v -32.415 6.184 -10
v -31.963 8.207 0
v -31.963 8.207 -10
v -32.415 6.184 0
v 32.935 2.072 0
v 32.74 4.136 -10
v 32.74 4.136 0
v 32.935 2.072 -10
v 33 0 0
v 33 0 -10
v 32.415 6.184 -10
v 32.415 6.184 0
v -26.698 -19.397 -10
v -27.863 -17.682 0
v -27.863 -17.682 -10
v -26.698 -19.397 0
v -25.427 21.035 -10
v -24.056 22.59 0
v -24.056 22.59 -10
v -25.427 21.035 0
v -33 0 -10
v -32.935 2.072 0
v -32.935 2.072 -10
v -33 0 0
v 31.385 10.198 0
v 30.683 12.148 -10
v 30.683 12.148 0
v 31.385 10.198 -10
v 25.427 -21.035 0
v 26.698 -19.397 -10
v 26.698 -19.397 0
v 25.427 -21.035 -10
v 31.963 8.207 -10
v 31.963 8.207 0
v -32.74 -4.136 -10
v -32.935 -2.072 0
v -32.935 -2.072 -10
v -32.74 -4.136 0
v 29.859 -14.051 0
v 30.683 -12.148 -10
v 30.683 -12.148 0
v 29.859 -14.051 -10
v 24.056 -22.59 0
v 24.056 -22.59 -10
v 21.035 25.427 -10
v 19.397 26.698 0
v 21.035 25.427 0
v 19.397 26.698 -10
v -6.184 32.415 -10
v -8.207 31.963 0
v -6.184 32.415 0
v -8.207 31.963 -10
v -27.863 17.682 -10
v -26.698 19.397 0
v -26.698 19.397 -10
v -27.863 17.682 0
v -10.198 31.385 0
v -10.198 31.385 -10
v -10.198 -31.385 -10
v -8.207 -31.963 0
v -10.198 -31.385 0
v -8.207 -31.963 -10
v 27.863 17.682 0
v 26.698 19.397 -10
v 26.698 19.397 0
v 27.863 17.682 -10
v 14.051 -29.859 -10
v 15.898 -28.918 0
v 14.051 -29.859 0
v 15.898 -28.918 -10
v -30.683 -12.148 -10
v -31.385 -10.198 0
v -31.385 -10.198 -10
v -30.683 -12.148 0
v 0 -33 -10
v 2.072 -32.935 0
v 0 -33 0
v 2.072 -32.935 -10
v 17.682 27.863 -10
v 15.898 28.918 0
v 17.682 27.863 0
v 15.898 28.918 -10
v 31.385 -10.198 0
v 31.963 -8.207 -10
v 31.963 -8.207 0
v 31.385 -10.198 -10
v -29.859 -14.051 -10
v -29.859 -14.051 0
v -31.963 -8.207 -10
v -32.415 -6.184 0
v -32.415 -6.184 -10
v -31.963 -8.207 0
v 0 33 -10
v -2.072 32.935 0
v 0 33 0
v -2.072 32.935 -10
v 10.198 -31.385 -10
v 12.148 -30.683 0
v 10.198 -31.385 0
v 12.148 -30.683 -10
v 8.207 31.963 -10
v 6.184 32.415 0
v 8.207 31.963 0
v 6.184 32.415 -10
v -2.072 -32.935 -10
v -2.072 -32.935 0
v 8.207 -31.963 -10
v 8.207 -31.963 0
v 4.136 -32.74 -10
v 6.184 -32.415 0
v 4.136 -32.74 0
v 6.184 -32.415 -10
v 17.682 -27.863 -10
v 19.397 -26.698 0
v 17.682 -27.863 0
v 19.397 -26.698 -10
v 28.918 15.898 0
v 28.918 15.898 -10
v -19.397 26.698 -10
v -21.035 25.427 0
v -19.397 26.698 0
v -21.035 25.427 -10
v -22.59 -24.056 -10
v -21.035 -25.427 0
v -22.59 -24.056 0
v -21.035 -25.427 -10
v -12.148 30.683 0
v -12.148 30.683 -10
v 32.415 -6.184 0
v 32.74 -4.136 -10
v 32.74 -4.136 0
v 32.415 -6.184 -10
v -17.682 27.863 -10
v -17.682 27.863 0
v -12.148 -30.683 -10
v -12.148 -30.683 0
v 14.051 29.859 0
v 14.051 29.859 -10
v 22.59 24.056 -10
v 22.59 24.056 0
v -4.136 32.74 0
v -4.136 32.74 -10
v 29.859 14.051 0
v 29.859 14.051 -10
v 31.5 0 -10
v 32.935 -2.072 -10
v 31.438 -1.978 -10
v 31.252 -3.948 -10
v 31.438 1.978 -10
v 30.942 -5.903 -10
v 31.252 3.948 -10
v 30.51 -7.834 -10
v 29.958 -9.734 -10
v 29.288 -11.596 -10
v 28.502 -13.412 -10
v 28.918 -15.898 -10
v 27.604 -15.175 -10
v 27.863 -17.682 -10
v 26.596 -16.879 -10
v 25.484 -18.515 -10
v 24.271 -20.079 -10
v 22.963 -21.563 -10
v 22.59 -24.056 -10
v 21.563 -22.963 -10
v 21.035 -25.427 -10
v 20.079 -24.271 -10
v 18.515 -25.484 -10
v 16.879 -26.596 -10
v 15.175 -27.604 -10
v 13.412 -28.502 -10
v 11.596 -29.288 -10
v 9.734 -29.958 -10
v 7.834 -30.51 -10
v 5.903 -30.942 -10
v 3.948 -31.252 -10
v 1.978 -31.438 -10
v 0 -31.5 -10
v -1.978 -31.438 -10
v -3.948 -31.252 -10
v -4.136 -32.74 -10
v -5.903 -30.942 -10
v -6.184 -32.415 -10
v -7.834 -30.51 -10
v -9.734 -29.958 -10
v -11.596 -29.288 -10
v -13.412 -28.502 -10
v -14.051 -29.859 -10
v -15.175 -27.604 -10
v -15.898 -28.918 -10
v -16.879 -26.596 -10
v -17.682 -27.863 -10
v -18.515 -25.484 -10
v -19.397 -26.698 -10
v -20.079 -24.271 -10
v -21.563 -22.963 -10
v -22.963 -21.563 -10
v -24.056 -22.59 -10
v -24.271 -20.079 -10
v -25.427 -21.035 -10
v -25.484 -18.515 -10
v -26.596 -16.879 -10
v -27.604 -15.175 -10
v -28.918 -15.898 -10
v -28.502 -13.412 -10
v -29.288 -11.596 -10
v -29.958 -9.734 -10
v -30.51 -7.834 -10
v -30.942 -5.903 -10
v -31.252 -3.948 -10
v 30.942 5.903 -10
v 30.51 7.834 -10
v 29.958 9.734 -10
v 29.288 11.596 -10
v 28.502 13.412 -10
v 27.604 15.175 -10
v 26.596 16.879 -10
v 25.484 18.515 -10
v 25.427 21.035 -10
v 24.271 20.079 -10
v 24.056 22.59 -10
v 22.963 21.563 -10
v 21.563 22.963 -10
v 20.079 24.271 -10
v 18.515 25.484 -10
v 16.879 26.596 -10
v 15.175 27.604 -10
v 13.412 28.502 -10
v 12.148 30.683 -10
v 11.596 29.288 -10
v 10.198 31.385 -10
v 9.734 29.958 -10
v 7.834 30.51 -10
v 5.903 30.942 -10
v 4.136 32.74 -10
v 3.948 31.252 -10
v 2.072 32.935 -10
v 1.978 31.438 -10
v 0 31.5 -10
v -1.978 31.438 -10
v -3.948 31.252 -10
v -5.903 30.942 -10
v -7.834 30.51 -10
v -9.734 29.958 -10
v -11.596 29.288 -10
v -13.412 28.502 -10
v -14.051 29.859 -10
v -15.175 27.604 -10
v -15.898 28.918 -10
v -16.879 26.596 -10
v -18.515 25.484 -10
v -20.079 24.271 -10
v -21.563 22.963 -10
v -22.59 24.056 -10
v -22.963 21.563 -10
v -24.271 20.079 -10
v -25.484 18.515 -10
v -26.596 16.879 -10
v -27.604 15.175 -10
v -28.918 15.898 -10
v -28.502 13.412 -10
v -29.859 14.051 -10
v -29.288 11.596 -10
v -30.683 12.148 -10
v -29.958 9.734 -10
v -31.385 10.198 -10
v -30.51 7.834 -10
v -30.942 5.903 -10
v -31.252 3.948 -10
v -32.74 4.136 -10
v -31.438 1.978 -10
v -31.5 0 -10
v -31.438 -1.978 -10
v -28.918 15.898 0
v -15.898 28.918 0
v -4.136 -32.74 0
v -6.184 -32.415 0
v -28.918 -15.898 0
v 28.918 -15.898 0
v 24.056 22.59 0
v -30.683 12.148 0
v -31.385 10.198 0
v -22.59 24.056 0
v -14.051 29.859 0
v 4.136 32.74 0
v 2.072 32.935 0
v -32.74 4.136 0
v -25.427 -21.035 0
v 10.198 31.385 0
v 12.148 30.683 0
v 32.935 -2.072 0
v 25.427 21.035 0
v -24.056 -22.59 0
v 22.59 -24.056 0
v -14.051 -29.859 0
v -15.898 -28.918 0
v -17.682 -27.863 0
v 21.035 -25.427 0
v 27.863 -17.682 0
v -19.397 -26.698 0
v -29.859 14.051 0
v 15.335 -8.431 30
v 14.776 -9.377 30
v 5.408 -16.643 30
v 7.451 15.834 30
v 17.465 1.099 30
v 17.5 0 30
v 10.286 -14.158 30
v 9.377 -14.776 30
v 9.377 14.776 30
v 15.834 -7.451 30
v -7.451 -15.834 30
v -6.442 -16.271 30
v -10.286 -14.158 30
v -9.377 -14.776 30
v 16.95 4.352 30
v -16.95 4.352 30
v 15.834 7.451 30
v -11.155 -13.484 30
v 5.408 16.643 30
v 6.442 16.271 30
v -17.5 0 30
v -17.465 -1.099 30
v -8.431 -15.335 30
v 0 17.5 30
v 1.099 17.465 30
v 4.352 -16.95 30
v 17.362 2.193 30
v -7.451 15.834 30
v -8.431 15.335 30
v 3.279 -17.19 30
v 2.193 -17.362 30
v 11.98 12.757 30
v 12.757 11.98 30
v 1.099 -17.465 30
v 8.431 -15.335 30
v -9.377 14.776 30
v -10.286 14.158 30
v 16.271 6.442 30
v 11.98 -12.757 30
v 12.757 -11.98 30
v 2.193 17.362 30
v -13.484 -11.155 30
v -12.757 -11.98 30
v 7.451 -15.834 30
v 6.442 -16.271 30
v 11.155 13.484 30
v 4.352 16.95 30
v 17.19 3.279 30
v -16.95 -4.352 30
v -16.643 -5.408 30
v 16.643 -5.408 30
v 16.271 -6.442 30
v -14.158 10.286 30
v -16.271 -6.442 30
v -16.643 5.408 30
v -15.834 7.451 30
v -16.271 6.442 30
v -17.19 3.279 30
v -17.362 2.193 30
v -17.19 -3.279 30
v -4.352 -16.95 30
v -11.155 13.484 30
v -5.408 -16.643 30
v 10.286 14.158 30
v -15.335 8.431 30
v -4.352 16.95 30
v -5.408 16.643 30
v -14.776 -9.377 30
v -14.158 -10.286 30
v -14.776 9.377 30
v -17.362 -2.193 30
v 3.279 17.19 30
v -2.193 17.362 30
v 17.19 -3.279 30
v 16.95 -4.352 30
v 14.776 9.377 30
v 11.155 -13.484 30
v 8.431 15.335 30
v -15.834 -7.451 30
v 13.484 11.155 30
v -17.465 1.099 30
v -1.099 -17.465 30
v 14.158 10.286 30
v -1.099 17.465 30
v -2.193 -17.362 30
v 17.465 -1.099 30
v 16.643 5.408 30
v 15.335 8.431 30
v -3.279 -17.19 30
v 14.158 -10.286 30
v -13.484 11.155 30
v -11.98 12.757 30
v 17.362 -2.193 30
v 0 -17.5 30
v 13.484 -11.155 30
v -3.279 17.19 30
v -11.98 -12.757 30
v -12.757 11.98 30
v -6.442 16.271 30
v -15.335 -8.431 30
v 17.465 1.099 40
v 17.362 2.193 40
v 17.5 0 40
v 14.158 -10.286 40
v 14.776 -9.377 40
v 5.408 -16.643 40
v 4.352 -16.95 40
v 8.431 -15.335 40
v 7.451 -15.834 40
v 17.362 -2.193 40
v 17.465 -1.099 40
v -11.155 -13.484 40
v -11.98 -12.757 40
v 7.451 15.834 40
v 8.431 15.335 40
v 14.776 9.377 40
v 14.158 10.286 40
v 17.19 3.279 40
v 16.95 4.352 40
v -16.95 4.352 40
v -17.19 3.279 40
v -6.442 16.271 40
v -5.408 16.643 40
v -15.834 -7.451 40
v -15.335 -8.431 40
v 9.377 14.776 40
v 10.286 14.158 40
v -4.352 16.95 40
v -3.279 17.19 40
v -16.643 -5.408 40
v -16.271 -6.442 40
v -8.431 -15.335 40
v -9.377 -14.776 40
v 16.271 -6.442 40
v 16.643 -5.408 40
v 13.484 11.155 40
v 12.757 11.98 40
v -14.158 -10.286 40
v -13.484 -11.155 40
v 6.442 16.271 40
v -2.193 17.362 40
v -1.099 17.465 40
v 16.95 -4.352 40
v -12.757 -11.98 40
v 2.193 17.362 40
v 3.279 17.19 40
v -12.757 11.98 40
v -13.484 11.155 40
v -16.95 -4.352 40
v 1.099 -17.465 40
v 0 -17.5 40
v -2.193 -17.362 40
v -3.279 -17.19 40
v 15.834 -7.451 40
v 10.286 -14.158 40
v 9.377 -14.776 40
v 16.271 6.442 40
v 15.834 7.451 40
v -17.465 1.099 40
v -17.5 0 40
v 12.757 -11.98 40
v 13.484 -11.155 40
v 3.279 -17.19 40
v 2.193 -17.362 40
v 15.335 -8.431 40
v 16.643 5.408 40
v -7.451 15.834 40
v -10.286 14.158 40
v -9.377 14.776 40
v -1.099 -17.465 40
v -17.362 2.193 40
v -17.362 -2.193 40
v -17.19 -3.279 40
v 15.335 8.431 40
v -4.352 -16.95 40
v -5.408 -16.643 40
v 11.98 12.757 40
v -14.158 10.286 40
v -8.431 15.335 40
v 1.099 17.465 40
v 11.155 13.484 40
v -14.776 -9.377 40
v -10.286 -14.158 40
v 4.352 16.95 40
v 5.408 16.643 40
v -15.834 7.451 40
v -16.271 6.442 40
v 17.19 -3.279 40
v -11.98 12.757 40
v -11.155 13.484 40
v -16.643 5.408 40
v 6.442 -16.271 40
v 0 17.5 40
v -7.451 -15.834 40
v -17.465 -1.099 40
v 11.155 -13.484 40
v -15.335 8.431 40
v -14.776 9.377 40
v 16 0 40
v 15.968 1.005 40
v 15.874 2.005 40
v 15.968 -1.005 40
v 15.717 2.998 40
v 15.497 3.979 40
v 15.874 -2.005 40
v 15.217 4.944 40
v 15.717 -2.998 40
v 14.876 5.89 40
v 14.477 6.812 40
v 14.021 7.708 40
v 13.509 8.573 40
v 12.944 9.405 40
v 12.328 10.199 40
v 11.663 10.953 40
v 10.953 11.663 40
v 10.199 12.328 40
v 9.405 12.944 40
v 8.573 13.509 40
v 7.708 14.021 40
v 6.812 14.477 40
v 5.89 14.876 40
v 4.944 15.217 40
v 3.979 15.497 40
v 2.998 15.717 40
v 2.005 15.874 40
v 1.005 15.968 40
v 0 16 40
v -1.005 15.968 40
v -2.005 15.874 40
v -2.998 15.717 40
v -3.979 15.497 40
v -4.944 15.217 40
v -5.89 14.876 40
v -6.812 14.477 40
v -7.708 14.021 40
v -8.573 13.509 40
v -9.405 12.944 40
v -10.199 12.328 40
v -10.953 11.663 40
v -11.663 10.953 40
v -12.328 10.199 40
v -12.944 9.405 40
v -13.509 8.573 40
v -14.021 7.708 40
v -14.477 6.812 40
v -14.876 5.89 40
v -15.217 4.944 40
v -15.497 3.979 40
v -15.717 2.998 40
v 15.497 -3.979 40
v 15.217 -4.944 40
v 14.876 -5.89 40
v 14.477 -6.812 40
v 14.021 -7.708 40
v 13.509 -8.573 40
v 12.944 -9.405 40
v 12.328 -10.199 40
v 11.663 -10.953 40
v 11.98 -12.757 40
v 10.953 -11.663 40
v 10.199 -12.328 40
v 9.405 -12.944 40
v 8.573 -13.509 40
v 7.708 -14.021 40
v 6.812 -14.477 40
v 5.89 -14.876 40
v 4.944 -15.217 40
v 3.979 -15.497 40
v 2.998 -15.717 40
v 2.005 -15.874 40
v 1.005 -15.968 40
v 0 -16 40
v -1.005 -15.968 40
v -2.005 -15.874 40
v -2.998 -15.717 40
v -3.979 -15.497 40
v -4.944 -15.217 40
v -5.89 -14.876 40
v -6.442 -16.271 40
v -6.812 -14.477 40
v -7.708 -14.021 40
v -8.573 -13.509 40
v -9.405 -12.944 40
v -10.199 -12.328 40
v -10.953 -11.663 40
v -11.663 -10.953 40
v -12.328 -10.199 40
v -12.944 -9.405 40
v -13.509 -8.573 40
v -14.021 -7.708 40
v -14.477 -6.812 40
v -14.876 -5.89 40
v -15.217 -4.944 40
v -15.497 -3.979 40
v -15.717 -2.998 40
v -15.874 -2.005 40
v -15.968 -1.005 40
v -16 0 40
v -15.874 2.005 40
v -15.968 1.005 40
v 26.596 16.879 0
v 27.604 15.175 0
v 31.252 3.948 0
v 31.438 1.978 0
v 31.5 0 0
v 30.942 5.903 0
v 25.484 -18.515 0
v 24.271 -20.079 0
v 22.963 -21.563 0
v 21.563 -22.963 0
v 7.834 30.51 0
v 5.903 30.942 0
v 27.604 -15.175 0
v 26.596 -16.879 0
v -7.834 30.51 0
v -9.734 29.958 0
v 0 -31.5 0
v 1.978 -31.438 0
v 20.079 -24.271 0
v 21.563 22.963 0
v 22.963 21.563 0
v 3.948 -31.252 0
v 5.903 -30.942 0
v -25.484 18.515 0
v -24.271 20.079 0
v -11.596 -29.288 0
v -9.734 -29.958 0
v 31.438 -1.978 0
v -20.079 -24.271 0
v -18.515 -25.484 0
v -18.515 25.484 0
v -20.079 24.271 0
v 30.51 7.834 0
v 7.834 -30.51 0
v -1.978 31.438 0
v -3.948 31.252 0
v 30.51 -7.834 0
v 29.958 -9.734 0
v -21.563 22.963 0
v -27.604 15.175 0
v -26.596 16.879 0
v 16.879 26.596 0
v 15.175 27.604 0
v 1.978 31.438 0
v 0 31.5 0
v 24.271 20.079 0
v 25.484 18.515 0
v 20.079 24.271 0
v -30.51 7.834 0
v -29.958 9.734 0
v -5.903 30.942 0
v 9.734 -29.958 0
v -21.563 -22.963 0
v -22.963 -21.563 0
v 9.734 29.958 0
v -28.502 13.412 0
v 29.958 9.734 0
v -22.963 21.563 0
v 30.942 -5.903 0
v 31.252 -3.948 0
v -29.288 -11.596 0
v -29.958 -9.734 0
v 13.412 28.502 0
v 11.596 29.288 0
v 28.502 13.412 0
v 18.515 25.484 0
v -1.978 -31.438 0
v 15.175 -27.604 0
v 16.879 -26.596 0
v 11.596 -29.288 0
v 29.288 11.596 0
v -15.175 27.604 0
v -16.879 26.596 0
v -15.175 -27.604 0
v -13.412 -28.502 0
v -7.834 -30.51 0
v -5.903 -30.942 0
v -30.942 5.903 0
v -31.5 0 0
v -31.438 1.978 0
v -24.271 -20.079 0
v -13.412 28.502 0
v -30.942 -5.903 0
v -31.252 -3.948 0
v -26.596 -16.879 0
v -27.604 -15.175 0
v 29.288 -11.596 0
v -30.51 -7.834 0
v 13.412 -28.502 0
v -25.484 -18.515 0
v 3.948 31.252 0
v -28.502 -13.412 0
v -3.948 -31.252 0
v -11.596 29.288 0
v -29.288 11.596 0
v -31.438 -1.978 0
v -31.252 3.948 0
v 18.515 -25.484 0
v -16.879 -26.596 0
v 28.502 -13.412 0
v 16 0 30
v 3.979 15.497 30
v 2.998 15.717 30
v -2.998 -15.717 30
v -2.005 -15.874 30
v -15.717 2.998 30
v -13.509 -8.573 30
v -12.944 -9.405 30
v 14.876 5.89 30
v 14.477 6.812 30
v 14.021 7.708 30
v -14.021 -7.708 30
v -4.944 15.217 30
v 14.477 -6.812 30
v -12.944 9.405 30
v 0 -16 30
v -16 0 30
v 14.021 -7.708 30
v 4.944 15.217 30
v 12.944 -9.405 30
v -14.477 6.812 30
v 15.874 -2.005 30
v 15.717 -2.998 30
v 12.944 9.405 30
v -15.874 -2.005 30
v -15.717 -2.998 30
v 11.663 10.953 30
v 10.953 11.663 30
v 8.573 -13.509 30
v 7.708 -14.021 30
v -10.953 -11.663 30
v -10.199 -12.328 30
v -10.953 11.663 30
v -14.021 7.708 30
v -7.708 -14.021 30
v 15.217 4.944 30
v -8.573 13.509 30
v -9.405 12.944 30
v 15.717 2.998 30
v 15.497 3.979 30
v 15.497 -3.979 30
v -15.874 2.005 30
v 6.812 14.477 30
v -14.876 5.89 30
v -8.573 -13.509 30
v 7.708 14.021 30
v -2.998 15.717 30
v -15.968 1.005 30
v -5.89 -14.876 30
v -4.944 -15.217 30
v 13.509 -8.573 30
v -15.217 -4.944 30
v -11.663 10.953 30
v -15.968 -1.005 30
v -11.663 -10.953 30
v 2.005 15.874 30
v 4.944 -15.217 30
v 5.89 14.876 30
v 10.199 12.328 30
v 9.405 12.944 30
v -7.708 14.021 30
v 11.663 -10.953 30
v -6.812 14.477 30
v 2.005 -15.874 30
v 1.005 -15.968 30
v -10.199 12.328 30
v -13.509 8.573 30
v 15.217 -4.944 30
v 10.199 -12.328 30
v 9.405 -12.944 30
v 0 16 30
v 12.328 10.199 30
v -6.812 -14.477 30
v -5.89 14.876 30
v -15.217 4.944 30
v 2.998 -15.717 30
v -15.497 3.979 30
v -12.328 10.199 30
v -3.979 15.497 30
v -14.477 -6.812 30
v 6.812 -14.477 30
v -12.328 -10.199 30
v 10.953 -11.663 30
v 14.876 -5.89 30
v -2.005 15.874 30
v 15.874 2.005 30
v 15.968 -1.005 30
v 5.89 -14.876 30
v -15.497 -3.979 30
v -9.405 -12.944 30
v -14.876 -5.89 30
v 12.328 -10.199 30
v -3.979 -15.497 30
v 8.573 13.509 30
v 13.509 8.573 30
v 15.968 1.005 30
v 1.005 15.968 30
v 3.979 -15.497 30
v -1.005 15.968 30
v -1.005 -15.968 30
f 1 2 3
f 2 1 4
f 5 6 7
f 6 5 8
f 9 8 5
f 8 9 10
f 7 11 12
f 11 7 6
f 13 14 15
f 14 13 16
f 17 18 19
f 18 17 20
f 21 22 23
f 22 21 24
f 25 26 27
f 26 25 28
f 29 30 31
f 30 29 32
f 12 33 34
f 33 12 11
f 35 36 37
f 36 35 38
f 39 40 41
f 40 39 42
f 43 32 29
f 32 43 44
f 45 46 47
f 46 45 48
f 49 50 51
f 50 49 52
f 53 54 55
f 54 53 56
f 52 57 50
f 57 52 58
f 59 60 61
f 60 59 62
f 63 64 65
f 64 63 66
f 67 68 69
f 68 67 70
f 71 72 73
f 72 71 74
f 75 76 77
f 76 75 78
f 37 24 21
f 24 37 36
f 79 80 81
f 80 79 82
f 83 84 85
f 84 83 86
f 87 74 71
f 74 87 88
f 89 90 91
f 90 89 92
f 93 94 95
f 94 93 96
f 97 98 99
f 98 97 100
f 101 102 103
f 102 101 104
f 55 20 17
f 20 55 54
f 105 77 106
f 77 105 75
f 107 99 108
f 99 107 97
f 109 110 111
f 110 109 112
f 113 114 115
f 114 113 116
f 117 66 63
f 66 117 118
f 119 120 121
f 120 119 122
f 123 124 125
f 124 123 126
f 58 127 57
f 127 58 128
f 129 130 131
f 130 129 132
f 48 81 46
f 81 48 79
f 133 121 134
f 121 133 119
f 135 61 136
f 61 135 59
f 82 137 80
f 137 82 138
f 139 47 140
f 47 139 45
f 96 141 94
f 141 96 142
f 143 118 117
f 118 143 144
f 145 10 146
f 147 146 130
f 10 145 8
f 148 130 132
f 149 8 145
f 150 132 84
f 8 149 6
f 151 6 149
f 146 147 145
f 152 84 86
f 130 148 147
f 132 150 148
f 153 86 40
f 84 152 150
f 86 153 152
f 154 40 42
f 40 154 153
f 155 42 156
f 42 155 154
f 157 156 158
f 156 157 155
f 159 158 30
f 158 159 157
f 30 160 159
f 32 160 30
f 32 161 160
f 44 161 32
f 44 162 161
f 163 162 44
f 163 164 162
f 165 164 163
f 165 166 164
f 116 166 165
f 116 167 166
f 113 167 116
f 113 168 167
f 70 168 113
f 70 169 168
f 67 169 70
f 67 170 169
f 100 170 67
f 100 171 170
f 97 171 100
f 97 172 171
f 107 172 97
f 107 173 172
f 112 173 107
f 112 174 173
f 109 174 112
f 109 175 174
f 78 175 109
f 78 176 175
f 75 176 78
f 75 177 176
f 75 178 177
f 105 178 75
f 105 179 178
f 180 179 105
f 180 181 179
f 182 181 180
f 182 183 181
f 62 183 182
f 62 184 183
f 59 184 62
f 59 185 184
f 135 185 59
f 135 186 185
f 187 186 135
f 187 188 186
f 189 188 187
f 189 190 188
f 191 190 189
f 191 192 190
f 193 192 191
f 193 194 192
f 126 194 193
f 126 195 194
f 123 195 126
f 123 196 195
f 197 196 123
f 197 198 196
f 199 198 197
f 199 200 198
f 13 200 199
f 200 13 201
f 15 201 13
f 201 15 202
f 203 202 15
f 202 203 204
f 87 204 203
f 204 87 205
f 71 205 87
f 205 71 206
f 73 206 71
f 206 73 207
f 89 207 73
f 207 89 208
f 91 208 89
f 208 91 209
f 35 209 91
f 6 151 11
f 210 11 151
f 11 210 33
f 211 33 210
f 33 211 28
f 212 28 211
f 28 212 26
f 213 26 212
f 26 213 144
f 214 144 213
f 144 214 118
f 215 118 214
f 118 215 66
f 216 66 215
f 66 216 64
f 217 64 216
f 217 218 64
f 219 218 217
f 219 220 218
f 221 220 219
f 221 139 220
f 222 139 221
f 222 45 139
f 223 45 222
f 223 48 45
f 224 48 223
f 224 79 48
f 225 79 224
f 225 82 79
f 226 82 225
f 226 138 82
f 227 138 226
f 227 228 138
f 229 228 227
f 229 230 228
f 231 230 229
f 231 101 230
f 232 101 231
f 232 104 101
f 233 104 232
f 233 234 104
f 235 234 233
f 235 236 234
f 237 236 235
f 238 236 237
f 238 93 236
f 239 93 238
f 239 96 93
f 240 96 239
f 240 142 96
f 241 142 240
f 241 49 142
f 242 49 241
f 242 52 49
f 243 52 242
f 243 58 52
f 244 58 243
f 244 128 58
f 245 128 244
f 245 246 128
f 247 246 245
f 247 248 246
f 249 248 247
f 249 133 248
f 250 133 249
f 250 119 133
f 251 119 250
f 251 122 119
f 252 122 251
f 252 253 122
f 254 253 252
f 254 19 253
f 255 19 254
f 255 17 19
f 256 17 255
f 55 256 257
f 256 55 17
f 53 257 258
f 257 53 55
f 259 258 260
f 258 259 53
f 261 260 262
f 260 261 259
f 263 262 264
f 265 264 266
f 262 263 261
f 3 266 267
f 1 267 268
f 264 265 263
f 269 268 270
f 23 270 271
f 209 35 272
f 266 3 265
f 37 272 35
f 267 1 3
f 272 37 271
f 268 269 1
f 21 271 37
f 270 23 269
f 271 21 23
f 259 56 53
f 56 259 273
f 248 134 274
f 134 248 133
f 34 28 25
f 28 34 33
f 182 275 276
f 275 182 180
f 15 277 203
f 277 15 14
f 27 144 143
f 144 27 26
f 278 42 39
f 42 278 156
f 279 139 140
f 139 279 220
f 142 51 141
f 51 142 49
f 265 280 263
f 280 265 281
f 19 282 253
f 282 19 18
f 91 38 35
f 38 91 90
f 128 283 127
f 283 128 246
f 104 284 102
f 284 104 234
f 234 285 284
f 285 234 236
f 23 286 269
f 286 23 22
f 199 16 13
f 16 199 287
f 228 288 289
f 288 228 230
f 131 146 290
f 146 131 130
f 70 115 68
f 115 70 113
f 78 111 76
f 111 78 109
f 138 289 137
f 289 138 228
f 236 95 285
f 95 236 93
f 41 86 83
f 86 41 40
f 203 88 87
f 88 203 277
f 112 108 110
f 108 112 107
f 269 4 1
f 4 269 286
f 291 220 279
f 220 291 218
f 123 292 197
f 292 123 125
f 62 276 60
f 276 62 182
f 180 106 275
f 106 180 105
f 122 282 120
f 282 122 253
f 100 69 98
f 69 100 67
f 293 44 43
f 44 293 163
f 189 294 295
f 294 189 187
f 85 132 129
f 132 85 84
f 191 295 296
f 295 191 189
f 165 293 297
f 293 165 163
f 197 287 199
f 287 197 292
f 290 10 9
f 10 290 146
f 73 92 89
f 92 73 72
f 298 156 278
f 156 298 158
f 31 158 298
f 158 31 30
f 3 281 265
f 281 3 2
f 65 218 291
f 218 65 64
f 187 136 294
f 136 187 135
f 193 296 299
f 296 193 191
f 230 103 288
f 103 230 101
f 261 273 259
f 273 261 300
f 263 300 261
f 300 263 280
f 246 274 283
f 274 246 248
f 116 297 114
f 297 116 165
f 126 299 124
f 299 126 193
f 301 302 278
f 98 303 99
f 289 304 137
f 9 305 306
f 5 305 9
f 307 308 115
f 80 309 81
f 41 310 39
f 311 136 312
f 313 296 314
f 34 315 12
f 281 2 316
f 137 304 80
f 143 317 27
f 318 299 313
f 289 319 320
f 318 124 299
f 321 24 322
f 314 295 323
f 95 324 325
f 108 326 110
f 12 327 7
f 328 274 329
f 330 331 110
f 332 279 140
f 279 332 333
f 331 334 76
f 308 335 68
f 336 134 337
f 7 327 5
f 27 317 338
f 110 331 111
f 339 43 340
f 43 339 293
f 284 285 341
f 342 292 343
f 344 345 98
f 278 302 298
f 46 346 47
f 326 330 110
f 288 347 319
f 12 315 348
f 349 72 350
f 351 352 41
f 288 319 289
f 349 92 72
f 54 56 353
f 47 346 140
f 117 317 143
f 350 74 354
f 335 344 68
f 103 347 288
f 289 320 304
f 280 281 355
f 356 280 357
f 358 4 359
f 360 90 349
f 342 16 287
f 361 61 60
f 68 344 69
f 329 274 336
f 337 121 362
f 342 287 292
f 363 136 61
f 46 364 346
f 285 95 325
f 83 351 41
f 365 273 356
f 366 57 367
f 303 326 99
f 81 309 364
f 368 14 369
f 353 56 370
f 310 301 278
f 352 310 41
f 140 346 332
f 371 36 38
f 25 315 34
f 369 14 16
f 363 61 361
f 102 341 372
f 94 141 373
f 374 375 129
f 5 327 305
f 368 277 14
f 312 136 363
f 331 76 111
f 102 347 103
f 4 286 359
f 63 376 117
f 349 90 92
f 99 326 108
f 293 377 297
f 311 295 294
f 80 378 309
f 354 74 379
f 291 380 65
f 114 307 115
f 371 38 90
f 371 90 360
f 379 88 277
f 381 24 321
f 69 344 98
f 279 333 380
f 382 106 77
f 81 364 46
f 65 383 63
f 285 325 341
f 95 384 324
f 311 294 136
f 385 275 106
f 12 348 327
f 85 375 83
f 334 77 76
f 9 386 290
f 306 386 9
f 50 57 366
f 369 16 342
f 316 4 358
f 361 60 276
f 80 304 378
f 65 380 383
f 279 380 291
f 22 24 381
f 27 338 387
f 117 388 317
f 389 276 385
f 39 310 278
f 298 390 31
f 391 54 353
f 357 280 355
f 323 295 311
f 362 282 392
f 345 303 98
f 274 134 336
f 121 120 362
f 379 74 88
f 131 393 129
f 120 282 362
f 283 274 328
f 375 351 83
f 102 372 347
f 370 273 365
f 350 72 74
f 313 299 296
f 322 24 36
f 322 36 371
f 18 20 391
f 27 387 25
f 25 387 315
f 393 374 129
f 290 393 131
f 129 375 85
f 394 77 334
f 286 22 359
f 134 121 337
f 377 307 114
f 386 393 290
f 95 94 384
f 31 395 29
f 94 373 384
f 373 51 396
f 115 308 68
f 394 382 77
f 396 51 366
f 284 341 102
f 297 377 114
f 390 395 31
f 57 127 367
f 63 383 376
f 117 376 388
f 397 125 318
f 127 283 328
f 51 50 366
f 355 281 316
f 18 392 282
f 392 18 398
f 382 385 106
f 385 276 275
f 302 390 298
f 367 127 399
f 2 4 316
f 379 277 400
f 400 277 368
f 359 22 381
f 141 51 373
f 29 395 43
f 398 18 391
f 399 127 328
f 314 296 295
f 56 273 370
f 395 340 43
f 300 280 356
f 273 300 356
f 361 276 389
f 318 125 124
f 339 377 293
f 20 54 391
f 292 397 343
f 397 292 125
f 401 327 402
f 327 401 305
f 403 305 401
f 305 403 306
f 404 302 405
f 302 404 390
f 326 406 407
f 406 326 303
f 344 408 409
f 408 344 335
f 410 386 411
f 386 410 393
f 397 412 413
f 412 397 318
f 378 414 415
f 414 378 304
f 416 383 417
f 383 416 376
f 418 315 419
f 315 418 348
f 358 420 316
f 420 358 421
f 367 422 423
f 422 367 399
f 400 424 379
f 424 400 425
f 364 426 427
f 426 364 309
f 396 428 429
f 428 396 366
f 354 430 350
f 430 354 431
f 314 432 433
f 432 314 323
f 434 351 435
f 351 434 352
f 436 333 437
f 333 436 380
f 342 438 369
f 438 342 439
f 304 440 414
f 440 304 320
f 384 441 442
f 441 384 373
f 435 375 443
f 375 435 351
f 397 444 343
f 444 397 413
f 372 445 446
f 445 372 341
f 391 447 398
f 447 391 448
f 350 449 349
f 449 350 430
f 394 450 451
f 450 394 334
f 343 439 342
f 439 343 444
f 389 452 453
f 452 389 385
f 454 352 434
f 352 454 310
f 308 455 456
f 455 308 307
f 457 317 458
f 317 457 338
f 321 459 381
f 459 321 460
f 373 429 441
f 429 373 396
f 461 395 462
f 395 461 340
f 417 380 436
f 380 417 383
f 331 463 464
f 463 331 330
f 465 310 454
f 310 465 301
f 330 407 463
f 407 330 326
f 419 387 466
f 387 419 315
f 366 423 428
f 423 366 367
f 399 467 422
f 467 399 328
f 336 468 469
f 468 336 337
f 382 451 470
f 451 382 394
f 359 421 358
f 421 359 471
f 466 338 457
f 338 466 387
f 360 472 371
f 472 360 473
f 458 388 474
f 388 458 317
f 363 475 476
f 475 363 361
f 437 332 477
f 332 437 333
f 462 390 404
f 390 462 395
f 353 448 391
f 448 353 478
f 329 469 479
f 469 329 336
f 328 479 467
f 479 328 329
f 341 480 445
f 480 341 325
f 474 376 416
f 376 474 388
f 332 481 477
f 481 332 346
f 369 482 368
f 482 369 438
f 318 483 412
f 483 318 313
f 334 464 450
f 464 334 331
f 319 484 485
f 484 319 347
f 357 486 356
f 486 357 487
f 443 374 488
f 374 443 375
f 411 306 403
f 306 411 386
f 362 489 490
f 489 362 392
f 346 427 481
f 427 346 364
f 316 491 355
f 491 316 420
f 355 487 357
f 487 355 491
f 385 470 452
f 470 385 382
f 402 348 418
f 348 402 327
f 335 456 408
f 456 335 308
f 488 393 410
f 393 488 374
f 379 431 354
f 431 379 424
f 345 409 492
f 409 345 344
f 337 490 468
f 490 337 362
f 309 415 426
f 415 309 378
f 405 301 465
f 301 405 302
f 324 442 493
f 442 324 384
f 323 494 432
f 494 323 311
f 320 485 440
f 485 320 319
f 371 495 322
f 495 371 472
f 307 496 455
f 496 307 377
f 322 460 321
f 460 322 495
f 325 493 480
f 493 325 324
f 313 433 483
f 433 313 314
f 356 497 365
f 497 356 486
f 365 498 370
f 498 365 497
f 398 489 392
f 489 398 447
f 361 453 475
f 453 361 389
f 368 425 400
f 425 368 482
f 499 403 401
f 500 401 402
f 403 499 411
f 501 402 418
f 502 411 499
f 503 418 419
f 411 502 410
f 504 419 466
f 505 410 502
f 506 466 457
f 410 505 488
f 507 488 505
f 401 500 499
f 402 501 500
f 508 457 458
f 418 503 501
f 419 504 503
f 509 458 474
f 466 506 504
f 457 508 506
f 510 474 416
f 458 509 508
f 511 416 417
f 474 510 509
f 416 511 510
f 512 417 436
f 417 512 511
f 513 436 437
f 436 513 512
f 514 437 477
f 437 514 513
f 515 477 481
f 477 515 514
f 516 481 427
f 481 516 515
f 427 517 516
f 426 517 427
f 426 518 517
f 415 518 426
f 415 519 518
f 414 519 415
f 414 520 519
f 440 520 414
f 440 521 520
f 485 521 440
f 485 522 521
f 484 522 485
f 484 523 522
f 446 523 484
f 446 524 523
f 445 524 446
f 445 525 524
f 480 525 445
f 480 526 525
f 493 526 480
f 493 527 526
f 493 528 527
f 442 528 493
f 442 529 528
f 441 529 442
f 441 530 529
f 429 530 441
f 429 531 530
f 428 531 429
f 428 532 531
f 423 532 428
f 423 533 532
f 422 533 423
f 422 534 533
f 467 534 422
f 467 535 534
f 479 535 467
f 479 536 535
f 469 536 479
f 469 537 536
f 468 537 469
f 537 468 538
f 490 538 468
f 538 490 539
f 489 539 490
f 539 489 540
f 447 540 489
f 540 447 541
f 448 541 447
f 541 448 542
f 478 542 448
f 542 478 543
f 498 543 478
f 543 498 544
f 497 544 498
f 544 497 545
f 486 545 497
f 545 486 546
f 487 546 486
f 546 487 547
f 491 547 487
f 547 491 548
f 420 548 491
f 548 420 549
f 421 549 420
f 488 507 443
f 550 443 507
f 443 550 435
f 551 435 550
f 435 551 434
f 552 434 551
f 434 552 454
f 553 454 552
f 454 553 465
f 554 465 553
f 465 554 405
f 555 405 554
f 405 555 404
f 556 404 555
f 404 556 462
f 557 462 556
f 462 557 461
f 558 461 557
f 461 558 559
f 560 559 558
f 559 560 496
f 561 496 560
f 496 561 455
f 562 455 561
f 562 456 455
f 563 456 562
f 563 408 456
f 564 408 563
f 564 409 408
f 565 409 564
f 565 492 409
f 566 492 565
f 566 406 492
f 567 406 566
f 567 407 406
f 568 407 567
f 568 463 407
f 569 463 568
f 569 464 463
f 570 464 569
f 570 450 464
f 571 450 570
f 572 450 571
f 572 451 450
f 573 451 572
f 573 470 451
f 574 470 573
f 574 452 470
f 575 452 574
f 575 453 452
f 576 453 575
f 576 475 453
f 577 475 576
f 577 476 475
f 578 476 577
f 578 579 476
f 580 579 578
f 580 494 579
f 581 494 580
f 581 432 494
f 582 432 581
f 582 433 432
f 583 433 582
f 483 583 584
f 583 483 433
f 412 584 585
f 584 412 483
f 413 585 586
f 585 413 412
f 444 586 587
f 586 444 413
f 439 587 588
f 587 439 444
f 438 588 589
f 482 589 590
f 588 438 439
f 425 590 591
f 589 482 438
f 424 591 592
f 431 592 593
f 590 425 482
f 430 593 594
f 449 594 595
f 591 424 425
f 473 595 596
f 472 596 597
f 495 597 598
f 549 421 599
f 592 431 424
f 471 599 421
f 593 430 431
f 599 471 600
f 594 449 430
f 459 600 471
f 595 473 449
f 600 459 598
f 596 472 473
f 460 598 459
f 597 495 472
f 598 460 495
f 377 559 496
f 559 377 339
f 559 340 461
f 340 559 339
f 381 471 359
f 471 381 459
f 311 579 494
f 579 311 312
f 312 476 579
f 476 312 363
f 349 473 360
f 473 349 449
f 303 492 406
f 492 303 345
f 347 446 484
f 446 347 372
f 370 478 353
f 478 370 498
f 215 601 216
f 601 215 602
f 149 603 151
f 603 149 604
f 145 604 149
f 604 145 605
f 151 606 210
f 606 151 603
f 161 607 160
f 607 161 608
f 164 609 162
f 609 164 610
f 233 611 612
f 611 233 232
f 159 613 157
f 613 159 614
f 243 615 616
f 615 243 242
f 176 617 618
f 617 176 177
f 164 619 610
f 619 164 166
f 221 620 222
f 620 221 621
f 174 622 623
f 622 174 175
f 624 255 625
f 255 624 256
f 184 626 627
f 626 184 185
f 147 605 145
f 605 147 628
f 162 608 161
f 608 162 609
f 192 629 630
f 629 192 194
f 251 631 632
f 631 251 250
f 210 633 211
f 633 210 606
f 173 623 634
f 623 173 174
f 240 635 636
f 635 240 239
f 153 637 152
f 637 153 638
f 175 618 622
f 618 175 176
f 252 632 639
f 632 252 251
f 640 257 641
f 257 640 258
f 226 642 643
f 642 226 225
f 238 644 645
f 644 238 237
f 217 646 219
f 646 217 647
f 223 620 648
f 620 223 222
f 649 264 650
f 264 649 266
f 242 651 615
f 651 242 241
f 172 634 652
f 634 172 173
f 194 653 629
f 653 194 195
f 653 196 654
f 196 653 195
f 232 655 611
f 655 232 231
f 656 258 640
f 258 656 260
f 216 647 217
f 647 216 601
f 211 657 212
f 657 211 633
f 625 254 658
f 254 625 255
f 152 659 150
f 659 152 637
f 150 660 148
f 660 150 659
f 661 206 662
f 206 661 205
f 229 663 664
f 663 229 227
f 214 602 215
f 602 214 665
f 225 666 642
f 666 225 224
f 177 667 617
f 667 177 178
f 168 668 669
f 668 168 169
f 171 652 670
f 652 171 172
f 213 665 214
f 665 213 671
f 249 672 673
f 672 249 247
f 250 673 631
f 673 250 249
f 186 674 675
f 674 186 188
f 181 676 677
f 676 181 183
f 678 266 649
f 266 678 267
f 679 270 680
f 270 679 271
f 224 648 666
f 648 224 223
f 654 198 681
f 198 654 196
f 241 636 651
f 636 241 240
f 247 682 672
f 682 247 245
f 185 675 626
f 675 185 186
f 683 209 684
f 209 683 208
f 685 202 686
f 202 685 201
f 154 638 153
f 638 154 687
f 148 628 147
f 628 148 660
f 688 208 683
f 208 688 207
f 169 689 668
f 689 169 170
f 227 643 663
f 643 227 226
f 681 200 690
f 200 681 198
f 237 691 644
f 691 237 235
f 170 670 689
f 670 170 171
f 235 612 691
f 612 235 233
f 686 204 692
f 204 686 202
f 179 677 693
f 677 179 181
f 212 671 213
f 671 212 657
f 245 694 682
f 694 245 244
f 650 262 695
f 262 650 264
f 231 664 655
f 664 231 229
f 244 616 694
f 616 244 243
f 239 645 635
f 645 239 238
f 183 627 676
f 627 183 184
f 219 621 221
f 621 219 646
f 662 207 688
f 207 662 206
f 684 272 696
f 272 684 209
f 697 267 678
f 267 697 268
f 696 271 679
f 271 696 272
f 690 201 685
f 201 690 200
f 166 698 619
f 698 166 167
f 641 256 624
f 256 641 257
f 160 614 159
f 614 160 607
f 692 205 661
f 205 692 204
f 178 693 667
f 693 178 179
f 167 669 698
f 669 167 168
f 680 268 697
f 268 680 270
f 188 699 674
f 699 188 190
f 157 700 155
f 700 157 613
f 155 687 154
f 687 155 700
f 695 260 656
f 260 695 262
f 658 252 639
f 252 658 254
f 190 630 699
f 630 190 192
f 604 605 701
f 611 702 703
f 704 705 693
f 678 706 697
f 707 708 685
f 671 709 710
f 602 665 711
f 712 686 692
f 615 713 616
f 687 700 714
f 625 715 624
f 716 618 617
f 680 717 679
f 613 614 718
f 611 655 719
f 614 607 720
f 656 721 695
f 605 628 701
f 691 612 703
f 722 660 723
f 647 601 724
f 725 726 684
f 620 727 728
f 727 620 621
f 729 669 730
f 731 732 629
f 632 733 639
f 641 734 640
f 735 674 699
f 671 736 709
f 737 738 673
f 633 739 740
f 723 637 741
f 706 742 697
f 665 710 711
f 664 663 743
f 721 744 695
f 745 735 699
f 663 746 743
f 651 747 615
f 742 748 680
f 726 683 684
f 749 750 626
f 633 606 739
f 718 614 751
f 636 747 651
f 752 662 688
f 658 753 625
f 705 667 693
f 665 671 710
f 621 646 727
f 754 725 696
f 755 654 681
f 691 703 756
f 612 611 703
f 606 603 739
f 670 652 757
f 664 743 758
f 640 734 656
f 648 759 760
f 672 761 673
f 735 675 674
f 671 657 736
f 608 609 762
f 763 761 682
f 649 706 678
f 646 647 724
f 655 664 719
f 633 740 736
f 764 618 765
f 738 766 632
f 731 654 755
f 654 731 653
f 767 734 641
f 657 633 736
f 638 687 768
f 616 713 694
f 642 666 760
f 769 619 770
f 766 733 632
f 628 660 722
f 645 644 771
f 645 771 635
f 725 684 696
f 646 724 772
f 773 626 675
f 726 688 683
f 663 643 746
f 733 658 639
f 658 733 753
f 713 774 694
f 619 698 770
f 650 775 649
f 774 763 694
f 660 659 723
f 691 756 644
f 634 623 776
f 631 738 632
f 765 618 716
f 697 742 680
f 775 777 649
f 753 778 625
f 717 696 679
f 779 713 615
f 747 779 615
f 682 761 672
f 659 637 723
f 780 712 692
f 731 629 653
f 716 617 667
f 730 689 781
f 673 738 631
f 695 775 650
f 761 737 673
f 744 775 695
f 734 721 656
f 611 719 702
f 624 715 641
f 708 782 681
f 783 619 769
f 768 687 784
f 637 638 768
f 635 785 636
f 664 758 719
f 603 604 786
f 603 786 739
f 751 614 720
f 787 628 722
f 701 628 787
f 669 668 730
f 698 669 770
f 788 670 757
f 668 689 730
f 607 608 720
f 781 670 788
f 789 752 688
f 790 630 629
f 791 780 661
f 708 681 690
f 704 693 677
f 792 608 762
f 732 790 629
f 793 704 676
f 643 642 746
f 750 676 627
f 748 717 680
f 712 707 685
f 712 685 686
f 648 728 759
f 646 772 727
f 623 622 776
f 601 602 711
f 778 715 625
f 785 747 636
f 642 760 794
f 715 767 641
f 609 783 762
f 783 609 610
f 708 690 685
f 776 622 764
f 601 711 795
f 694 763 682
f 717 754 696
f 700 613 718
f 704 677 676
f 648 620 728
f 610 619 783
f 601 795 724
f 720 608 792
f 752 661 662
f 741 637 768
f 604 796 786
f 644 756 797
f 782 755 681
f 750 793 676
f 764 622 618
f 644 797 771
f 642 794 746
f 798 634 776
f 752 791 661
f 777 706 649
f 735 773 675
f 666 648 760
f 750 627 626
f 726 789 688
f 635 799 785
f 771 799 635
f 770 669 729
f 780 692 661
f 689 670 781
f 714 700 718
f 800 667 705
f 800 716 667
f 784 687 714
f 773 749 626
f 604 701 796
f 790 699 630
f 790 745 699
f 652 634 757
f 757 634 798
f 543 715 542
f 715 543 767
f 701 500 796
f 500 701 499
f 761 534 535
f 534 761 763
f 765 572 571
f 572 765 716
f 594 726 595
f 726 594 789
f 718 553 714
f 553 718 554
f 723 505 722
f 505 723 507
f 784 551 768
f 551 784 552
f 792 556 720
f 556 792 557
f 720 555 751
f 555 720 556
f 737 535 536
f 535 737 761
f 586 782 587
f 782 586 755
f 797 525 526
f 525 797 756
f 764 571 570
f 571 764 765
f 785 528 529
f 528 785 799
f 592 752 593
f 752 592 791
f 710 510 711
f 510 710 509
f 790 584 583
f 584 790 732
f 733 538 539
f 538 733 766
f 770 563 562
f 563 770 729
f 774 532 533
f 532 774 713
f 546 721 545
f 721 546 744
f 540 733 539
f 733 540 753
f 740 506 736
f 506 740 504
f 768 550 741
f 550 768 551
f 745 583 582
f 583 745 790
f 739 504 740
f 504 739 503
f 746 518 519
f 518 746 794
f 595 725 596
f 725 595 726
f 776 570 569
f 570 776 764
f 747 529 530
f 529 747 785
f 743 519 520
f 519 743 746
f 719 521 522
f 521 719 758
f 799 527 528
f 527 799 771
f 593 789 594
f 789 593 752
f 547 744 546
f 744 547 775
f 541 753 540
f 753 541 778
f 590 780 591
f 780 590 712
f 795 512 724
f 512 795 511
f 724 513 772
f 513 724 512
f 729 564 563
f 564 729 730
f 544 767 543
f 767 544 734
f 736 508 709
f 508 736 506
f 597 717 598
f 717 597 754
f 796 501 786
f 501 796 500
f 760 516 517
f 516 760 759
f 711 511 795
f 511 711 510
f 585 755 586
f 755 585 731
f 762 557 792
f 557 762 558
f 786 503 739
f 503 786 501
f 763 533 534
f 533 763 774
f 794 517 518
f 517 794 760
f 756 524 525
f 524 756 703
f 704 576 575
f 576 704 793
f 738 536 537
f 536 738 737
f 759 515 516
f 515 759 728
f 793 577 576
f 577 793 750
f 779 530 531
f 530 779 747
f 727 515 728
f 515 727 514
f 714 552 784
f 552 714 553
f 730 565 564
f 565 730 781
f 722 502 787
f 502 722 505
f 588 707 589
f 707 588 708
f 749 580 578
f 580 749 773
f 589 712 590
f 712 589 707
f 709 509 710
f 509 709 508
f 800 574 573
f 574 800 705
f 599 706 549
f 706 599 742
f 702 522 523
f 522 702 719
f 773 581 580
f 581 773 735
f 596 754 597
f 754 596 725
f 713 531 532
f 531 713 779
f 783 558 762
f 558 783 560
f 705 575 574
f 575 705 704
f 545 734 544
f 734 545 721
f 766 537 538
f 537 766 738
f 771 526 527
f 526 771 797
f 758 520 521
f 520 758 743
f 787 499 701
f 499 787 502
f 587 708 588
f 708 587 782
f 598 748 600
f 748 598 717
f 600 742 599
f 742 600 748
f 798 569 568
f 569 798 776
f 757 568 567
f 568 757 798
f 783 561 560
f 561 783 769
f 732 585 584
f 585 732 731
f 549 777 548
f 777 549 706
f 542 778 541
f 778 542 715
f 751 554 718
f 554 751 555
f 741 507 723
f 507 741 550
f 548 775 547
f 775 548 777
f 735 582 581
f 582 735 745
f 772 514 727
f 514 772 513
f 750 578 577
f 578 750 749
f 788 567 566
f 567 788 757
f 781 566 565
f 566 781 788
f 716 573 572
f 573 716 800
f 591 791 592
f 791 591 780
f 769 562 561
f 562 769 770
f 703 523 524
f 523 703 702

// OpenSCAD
SmallDiameter=32;
LargeDiameter=63;
WallThick=3;
SleeveLength=10;
ConeLength=30;

$fn = 100;

difference(){
    union(){
        translate([0,0,-SleeveLength]) cylinder(d=LargeDiameter+WallThick,h=SleeveLength);
        cylinder(d1=LargeDiameter+WallThick,d2=SmallDiameter+WallThick,h=ConeLength);
        translate([0,0,ConeLength]) cylinder(d=SmallDiameter+WallThick,h=SleeveLength);
    }
    union(){
        translate([0,0,-SleeveLength]) cylinder(d=LargeDiameter,h=SleeveLength);
        cylinder(d1=LargeDiameter,d2=SmallDiameter,h=ConeLength);
        translate([0,0,ConeLength]) cylinder(d=SmallDiameter,h=SleeveLength);
    }
}
